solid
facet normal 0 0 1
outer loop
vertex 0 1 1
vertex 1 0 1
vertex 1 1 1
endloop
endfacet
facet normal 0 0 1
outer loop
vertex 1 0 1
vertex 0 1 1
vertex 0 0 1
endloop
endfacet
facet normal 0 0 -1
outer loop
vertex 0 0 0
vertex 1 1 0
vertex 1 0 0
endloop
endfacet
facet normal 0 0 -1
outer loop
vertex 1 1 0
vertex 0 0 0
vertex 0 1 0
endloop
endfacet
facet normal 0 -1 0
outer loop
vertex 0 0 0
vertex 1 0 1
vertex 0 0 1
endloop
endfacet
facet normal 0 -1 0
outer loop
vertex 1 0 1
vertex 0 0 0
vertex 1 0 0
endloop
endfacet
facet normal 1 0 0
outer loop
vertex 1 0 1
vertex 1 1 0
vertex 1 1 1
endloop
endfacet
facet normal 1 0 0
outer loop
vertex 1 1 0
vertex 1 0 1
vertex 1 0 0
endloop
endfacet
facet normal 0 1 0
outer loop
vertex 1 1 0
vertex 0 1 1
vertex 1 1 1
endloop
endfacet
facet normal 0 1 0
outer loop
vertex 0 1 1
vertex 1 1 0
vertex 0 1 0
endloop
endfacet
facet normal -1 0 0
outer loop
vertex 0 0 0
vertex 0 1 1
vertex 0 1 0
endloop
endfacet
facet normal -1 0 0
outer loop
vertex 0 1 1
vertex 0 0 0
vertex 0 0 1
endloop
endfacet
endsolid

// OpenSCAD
 sales =
 [
  [
    330662,
    370662,
    400662,
    410662,
    410662,
    433136,
    434130,
    497716,
    389213,
    344095,
    280587,
    330381,
    316641,
    287410,
    300778,
    310676,
    280676,
    260676,
    245902,
    351342,
    347385,
    361316,
    337099,
    319957,
    316611,
    304596,
    394443,
    1115477,
    3019588,
    1295301,
    786726
  ],
  [
    644785,
    655269,
    675024,
    750024,
    665024,
    675024,
    705024,
    675024,
    695024,
    685024,
    645024,
    675024,
    685024,
    685824,
    675024,
    665024,
    755024,
    725024,
    705024,
    675024,
    755024,
    850024,
    1079979,
    823179,
    667667,
    1131933,
    1111564,
    355286,
    0,
    0,
    0
  ],
  [
    247308,
    246527,
    320066,
    289869,
    261226,
    247543,
    219077,
    222319,
    248806,
    330847,
    291845,
    280906,
    261615,
    221615,
    241615,
    221615,
    246083,
    231649,
    223718,
    201161,
    182378,
    174560,
    232325,
    291054,
    272185,
    236357,
    203794,
    203479,
    205825,
    241424,
    265565
  ],
  [
    270052,
    252394,
    205129,
    248632,
    188157,
    223509,
    239589,
    216577,
    191687,
    176621,
    166573,
    133047,
    167928,
    194634,
    199288,
    431198,
    2608379,
    950588,
    482433,
    318044,
    1035700,
    713030,
    223290,
    172263,
    179263,
    182263,
    180355,
    209918,
    177560,
    187560,
    0
  ],
  [
    190118,
    206039,
    185486,
    221259,
    288556,
    268680,
    260737,
    214554,
    196425,
    161084,
    207298,
    259692,
    232504,
    234939,
    216480,
    184622,
    144842,
    185285,
    229723,
    250137,
    205194,
    113520,
    133520,
    127520,
    143520,
    157358,
    320445,
    217795,
    195208,
    165373,
    183623
  ],
  [
    239207,
    289605,
    295183,
    275502,
    262484,
    209432,
    185726,
    232638,
    292385,
    258581,
    243401,
    197533,
    188229,
    179229,
    183229,
    214374,
    198112,
    204901,
    256134,
    180688,
    144644,
    175604,
    370718,
    186040,
    170163,
    177118,
    198827,
    208827,
    198827,
    238877,
    0
  ],
  [
    202876,
    192876,
    188876,
    195876,
    192876,
    200876,
    192876,
    202876,
    199876,
    195876,
    202876,
    200876,
    192876,
    203873,
    232426,
    189724,
    200733,
    189083,
    158727,
    184389,
    210810,
    192588,
    679635,
    2752238,
    1053488,
    590476,
    587564,
    1094075,
    830383,
    345504,
    267812
  ],
  [
    240474,
    215540,
    259760,
    252563,
    261154,
    230125,
    213281,
    353526,
    257080,
    247965,
    298415,
    299785,
    533716,
    2736681,
    1281446,
    755694,
    643393,
    1042922,
    635819,
    514875,
    454147,
    704147,
    784147,
    906144,
    772151,
    323559,
    254947,
    254947,
    254947,
    254947,
    254947
  ],
  [
    239124,
    346727,
    319263,
    304660,
    298316,
    249763,
    265507,
    431353,
    353018,
    305865,
    322274,
    309032,
    320411,
    366935,
    428853,
    411343,
    332458,
    303244,
    279241,
    240088,
    295786,
    392053,
    351147,
    336610,
    345231,
    304080,
    228172,
    304359,
    462633,
    531570,
    0
  ],
  [
    2285315,
    1120770,
    785336,
    622141,
    756431,
    781817,
    590094,
    412241,
    343037,
    344768,
    341243,
    414664,
    563657,
    454531,
    459435,
    433827,
    359094,
    325566,
    489183,
    595071,
    530089,
    494554,
    454004,
    472540,
    452540,
    422540,
    486543,
    401480,
    406972,
    422417,
    411653
  ],
  [
    626435,
    666435,
    669987,
    594779,
    734779,
    624779,
    704779,
    794779,
    778130,
    902207,
    1186462,
    1094901,
    1169932,
    1163238,
    1209128,
    1940460,
    2711758,
    3113137,
    1029998,
    862282,
    909220,
    839220,
    899220,
    985252,
    769324,
    786458,
    552207,
    1439709,
    996437,
    1204980,
    0
  ],
  [
    3269420,
    1582086,
    1483121,
    1830512,
    1459081,
    1525233,
    1754974,
    2157126,
    1981765,
    1916003,
    1929062,
    1873994,
    1772537,
    2027916,
    2453967,
    2131733,
    1952047,
    1932047,
    1452047,
    1252047,
    1094962,
    1159262,
    802062,
    552062,
    502062,
    482062,
    492062,
    452062,
    606286,
    551702,
    434586
  ]
];


for(i = [0 : 11]) {
	echo(str("row:",i));
	for(j = [0 : 30]) {
		echo(sales[i][j] / 20000);
	}
}
cube();




/*

for (month=[1:12], day = [1:31] ) {
	translate([day + 1, month + 1, 1])
	echo(month);
	echo(day);
	echo(sales[month - 1],[day - 1]);
	cube([1.05, 1, sales[day - 1][month - 1] / 500000]);
}
cube([35,16,1]);


*/
